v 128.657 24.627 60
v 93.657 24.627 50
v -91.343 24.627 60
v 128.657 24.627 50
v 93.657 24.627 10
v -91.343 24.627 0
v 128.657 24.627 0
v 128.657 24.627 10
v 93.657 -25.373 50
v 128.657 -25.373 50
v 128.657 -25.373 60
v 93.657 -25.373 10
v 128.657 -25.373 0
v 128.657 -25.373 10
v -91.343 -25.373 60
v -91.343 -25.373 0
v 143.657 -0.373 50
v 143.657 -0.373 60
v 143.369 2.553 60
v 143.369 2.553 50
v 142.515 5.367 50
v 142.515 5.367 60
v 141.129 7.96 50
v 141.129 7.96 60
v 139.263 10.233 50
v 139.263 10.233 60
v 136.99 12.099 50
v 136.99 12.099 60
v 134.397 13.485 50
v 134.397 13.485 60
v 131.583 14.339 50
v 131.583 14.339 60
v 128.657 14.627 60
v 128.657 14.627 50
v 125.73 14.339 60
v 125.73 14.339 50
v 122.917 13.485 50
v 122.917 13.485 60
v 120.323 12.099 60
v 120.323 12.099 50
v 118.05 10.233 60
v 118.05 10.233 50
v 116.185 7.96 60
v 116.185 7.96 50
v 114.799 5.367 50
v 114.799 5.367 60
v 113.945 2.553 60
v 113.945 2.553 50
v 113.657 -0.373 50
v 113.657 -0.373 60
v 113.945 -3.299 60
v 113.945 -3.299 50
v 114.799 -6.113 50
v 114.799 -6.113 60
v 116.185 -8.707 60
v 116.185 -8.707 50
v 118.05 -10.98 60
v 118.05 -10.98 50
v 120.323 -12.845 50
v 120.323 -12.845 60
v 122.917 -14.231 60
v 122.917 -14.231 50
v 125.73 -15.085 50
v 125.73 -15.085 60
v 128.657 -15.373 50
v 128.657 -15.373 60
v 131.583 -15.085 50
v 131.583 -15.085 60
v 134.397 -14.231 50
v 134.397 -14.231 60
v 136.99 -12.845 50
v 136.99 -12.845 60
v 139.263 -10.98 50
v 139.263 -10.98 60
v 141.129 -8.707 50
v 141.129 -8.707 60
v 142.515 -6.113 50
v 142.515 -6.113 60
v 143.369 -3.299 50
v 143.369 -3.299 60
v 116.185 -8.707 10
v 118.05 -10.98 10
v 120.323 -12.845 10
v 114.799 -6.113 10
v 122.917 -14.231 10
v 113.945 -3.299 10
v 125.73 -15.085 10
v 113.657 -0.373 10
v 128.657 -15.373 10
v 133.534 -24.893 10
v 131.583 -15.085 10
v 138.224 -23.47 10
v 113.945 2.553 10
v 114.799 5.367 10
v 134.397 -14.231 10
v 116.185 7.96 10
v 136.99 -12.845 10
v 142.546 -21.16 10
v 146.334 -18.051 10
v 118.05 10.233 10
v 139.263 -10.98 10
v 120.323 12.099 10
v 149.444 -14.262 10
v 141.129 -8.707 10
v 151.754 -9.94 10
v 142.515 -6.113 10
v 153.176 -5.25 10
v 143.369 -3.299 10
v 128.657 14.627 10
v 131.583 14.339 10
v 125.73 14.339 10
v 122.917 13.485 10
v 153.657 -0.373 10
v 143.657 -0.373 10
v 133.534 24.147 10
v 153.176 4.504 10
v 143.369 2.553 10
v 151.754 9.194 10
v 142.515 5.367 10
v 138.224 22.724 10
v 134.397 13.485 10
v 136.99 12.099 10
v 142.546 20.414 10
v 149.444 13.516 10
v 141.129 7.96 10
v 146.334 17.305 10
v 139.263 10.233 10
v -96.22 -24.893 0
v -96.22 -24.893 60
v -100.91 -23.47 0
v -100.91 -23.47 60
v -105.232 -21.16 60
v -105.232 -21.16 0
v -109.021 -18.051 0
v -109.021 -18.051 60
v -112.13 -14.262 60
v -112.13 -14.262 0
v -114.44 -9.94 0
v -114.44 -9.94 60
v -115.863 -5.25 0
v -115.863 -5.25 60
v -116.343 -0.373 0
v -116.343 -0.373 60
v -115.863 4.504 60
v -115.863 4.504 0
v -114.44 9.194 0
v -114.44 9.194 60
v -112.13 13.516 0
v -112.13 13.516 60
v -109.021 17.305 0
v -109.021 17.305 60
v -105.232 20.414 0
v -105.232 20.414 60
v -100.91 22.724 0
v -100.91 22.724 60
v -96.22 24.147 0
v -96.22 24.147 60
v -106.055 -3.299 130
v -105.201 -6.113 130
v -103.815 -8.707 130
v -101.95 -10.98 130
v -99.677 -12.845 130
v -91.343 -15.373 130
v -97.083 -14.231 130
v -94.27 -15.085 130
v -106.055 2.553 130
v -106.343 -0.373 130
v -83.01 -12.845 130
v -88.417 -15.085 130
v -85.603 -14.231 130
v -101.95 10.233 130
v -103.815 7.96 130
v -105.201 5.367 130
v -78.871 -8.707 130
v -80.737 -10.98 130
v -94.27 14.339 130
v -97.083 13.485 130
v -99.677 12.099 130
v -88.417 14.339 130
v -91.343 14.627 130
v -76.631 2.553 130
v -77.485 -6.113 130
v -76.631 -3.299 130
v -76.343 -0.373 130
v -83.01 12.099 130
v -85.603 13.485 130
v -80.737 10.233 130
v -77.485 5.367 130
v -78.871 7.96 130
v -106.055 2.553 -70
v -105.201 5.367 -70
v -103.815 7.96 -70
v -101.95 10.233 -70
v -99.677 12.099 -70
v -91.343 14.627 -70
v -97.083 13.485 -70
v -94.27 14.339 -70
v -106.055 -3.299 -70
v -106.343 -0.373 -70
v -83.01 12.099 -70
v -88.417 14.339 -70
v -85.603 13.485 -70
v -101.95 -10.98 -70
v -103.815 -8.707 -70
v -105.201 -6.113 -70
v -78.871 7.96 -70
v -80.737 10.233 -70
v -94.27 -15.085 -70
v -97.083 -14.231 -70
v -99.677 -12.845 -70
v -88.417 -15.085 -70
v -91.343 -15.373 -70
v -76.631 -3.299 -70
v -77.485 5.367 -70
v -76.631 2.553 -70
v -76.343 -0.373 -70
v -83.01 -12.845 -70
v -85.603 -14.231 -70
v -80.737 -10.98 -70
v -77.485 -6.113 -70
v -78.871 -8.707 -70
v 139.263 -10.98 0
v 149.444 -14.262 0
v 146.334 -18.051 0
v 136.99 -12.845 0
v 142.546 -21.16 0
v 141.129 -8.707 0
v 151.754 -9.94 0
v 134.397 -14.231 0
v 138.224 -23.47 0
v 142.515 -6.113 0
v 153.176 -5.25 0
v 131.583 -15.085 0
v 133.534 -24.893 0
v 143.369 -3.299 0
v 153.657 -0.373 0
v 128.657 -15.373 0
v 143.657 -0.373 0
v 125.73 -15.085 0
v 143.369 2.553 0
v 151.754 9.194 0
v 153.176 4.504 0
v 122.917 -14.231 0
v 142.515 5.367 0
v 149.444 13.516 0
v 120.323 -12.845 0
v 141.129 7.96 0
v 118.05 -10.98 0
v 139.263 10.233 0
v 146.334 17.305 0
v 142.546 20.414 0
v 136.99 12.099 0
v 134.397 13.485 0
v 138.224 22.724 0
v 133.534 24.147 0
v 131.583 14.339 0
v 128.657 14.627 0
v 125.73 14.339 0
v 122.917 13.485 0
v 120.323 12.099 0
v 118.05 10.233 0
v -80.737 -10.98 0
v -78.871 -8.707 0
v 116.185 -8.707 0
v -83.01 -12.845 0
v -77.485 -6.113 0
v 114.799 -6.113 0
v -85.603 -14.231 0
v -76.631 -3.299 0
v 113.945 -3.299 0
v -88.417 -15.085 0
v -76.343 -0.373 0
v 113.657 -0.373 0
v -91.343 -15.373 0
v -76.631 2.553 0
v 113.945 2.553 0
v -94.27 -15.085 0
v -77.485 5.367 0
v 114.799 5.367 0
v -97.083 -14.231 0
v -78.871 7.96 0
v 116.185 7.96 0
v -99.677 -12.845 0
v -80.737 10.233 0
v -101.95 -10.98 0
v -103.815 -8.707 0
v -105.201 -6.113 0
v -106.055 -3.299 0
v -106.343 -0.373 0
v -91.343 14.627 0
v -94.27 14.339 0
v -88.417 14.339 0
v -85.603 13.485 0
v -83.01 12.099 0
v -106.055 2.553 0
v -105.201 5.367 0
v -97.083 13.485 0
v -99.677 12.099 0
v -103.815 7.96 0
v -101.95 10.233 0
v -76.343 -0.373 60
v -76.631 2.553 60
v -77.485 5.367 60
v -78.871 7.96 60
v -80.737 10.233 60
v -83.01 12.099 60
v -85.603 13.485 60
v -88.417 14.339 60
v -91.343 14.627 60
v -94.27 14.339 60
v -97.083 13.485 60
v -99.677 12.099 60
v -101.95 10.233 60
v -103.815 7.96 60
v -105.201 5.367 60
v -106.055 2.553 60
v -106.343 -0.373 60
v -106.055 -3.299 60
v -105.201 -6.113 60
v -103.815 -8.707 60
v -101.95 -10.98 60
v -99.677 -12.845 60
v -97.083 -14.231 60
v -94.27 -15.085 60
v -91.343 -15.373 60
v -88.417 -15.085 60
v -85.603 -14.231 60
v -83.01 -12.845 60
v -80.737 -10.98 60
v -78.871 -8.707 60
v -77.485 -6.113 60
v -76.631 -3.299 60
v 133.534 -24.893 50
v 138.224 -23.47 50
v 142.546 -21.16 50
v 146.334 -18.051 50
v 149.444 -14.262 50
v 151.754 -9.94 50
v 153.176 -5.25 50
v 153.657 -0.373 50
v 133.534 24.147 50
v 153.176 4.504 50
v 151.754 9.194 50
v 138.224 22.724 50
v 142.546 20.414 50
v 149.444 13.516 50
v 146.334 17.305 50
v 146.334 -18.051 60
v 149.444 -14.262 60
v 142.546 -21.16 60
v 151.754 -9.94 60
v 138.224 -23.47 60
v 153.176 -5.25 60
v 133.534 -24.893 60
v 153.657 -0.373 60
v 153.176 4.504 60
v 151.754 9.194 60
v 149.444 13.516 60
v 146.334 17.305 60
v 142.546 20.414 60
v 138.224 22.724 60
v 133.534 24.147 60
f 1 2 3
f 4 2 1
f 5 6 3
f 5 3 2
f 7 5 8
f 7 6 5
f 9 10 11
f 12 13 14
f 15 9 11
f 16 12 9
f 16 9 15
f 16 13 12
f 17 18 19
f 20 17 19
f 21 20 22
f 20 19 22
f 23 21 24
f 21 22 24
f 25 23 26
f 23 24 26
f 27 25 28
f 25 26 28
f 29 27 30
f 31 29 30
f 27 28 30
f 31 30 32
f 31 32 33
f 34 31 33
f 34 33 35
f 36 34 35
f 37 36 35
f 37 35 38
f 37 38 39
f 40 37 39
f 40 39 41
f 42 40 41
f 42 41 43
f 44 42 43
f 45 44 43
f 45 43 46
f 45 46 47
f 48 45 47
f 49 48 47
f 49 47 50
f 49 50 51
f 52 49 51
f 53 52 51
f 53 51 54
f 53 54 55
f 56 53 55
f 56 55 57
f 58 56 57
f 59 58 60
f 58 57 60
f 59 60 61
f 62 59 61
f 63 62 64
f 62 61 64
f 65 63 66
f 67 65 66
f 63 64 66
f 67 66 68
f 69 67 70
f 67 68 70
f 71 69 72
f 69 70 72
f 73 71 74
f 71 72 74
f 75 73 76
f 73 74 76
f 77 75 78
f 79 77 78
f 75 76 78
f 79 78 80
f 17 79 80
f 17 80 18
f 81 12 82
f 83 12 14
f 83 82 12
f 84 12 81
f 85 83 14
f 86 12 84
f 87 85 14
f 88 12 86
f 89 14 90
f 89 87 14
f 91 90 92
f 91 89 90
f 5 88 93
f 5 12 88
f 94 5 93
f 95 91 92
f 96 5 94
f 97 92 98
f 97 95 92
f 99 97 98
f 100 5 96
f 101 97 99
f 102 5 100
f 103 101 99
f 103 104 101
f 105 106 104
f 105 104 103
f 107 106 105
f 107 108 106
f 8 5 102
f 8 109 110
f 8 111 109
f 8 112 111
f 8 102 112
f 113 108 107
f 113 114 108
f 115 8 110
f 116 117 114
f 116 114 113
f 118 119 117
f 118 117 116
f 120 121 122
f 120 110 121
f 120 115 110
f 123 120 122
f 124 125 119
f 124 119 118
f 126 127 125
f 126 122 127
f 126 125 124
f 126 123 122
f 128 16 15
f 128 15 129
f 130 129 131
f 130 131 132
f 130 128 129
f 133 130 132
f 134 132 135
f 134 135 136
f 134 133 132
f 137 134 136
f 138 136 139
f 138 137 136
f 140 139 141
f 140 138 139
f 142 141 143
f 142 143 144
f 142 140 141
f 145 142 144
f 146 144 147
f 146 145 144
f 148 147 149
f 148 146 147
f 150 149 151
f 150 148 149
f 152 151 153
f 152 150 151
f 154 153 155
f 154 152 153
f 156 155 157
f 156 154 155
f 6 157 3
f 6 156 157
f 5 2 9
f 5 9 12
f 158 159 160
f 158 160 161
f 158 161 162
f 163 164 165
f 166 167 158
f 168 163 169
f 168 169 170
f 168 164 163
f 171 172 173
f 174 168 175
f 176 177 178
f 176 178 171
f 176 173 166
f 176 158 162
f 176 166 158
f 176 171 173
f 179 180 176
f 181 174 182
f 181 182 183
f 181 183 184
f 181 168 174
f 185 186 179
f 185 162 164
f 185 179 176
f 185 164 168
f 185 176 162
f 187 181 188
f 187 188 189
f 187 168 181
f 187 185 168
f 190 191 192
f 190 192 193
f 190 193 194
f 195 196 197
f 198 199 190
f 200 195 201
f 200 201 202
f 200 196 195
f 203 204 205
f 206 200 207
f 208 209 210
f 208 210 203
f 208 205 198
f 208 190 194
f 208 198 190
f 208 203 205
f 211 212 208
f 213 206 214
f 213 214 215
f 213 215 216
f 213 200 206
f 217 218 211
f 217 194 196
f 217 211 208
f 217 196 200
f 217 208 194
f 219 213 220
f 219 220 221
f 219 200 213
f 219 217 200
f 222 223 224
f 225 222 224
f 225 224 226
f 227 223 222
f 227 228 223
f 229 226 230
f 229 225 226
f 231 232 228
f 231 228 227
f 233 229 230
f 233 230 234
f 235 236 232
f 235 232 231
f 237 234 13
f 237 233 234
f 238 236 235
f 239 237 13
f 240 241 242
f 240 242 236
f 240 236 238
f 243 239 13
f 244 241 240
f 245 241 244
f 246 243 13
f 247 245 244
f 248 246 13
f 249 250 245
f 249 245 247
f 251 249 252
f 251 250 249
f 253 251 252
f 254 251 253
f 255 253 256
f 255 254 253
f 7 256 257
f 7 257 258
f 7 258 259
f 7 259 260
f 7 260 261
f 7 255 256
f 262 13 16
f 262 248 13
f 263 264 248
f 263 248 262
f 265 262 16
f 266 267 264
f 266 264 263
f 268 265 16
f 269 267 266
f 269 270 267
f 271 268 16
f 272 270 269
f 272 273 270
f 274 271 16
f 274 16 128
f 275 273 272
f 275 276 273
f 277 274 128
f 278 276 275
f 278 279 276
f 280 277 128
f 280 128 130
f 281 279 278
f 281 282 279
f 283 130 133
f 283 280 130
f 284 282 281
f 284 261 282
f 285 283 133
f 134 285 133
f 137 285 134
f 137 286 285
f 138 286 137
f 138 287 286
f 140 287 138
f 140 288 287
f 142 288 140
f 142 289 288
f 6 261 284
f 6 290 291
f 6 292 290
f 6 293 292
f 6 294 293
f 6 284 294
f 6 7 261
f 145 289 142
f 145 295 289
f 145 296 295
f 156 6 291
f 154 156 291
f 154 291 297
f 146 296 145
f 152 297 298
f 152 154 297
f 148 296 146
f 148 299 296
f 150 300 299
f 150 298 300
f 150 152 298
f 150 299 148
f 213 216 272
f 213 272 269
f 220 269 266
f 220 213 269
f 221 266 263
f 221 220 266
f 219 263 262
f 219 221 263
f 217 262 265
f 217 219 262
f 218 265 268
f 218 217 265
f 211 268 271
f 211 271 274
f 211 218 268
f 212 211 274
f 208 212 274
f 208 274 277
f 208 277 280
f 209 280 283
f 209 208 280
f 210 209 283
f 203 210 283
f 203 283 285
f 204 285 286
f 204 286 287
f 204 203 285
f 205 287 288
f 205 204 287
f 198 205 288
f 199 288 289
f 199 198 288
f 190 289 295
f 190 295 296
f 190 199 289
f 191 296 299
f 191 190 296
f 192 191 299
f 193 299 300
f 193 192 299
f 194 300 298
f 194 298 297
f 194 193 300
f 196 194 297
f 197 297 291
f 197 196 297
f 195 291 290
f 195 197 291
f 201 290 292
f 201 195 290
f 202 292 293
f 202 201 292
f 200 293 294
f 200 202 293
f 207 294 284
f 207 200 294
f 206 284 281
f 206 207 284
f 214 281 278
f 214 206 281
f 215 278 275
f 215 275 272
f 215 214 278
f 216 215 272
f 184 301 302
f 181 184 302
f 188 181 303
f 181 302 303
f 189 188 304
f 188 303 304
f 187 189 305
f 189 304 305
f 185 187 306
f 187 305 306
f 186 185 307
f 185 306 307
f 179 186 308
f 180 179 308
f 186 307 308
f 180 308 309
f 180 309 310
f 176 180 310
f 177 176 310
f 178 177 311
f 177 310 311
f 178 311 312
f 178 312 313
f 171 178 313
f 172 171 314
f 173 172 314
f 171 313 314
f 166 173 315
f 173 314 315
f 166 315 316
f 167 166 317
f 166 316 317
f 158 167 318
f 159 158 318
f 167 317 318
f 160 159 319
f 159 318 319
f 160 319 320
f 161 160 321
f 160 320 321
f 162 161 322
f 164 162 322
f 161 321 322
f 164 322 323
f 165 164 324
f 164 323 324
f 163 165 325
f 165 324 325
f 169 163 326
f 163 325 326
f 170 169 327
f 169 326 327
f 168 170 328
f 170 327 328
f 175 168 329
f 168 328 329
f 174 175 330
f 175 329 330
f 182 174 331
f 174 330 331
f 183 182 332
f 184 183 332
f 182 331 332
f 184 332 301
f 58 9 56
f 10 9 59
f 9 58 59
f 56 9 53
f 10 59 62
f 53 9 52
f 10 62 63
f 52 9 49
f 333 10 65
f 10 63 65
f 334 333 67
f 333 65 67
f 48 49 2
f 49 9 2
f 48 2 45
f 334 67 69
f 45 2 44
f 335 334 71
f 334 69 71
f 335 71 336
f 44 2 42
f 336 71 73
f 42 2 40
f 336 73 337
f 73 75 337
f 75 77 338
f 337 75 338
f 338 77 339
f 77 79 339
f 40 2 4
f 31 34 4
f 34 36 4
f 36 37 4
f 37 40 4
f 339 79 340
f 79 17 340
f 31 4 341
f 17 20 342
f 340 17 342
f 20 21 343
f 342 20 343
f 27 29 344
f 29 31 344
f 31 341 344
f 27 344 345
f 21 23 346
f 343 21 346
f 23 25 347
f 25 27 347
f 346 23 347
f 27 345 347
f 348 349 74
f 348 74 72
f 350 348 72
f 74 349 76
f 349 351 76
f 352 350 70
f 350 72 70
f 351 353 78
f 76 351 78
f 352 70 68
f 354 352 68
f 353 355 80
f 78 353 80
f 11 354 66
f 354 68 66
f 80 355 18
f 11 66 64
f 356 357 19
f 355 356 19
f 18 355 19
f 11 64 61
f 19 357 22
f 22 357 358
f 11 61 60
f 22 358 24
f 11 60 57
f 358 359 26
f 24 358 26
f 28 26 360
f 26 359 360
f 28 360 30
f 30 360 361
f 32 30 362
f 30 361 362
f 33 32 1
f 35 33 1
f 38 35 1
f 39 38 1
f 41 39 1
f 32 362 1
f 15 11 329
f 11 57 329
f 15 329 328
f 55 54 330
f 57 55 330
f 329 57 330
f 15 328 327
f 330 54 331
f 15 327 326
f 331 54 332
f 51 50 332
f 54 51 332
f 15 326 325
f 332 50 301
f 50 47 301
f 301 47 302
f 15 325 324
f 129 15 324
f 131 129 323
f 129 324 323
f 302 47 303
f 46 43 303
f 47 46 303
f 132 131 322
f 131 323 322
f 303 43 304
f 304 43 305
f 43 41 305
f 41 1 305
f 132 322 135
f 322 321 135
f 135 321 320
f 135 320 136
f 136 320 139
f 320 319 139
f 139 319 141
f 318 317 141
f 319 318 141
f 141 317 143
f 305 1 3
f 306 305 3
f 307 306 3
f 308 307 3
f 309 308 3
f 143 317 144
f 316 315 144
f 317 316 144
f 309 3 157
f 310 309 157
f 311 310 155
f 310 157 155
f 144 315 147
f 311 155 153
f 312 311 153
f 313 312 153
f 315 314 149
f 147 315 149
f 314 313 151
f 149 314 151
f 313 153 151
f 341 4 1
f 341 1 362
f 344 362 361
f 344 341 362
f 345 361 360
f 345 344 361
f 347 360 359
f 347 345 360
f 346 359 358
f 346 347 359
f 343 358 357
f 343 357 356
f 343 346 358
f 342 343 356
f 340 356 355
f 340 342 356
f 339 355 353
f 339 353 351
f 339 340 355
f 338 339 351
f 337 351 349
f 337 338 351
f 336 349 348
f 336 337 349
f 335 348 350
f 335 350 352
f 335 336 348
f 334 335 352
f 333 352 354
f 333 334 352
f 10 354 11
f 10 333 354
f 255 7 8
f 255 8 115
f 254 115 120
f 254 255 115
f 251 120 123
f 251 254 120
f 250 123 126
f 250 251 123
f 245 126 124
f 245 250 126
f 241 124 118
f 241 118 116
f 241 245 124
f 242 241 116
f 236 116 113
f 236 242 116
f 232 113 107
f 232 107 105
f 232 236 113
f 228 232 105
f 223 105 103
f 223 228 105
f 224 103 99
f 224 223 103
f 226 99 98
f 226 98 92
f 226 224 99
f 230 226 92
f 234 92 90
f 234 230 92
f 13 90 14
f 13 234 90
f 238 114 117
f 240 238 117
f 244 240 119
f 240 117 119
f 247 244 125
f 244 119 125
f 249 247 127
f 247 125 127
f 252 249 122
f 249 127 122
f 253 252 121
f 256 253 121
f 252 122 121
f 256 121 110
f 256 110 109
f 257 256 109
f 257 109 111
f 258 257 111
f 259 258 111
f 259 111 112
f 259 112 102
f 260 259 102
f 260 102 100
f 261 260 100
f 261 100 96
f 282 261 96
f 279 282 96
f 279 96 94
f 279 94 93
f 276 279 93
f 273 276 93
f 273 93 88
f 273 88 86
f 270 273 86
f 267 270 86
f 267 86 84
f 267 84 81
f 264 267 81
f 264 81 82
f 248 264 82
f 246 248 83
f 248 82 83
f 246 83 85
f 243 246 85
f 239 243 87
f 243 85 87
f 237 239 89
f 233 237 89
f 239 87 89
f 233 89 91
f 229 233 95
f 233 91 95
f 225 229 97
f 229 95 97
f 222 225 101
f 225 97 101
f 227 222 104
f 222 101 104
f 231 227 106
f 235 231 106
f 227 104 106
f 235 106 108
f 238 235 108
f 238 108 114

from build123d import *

# Parameters (mm, degrees)
BOSS_EXTRUDE1_DEPTH = 60
SKETCH2_R           = 15
BOSS_EXTRUDE2_DEPTH = 70
BOSS_EXTRUDE3_START = 70
SKETCH3_R           = 15
BOSS_EXTRUDE3_DEPTH = 70
SKETCH4_W           = 60
SKETCH4_H           = 40
CUT_EXTRUDE1_DEPTH  = 75
SKETCH5_R           = 15
CUT_EXTRUDE2_DEPTH  = 75


with BuildPart() as part:
    # Sketch1 → Boss-Extrude1 (new body)
    with BuildSketch(Plane.XY):
        with BuildLine():
            Line((-91.343193625, 24.62689066), (128.656806375, 24.62689066))
            ThreePointArc((128.656806375, 24.62689066), (153.656806375, -0.37310934), (128.656806375, -25.37310934))
            Line((128.656806375, -25.37310934), (-91.343193625, -25.37310934))
            ThreePointArc((-91.343193625, -25.37310934), (-116.343193625, -0.37310934), (-91.343193625, 24.62689066))
        make_face()
    extrude(amount=BOSS_EXTRUDE1_DEPTH)

    # Sketch2 → Boss-Extrude2 (add)
    with BuildSketch(Plane.XY.offset(60)):
        with Locations((-91.343193625, -0.37310934)):
            Circle(SKETCH2_R)
    extrude(amount=BOSS_EXTRUDE2_DEPTH)

    # Sketch3 → Boss-Extrude3 (add)
    with BuildSketch(Plane(origin=(0, 0, 0), x_dir=(-1, 0, 0), z_dir=(0, 0, -1)).offset(BOSS_EXTRUDE3_START)):
        with Locations(Location((91.343193625, -0.37310934, 0), (0, 0, 180))):
            Circle(SKETCH3_R)
    extrude(amount=-BOSS_EXTRUDE3_DEPTH)

    # Sketch4 → Cut-Extrude1 (cut)
    with BuildSketch(Plane(origin=(0, 24.62689066, 0), x_dir=(1, 0, 0), z_dir=(0, 1, 0))):
        with Locations((123.656806375, -30)):
            Rectangle(SKETCH4_W, SKETCH4_H)
    extrude(amount=-CUT_EXTRUDE1_DEPTH, mode=Mode.SUBTRACT)

    # Sketch5 → Cut-Extrude2 (cut)
    with BuildSketch(Plane.XY.offset(60)):
        with Locations((128.656806375, -0.37310934)):
            Circle(SKETCH5_R)
    extrude(amount=-CUT_EXTRUDE2_DEPTH, mode=Mode.SUBTRACT)


solid = part.part
